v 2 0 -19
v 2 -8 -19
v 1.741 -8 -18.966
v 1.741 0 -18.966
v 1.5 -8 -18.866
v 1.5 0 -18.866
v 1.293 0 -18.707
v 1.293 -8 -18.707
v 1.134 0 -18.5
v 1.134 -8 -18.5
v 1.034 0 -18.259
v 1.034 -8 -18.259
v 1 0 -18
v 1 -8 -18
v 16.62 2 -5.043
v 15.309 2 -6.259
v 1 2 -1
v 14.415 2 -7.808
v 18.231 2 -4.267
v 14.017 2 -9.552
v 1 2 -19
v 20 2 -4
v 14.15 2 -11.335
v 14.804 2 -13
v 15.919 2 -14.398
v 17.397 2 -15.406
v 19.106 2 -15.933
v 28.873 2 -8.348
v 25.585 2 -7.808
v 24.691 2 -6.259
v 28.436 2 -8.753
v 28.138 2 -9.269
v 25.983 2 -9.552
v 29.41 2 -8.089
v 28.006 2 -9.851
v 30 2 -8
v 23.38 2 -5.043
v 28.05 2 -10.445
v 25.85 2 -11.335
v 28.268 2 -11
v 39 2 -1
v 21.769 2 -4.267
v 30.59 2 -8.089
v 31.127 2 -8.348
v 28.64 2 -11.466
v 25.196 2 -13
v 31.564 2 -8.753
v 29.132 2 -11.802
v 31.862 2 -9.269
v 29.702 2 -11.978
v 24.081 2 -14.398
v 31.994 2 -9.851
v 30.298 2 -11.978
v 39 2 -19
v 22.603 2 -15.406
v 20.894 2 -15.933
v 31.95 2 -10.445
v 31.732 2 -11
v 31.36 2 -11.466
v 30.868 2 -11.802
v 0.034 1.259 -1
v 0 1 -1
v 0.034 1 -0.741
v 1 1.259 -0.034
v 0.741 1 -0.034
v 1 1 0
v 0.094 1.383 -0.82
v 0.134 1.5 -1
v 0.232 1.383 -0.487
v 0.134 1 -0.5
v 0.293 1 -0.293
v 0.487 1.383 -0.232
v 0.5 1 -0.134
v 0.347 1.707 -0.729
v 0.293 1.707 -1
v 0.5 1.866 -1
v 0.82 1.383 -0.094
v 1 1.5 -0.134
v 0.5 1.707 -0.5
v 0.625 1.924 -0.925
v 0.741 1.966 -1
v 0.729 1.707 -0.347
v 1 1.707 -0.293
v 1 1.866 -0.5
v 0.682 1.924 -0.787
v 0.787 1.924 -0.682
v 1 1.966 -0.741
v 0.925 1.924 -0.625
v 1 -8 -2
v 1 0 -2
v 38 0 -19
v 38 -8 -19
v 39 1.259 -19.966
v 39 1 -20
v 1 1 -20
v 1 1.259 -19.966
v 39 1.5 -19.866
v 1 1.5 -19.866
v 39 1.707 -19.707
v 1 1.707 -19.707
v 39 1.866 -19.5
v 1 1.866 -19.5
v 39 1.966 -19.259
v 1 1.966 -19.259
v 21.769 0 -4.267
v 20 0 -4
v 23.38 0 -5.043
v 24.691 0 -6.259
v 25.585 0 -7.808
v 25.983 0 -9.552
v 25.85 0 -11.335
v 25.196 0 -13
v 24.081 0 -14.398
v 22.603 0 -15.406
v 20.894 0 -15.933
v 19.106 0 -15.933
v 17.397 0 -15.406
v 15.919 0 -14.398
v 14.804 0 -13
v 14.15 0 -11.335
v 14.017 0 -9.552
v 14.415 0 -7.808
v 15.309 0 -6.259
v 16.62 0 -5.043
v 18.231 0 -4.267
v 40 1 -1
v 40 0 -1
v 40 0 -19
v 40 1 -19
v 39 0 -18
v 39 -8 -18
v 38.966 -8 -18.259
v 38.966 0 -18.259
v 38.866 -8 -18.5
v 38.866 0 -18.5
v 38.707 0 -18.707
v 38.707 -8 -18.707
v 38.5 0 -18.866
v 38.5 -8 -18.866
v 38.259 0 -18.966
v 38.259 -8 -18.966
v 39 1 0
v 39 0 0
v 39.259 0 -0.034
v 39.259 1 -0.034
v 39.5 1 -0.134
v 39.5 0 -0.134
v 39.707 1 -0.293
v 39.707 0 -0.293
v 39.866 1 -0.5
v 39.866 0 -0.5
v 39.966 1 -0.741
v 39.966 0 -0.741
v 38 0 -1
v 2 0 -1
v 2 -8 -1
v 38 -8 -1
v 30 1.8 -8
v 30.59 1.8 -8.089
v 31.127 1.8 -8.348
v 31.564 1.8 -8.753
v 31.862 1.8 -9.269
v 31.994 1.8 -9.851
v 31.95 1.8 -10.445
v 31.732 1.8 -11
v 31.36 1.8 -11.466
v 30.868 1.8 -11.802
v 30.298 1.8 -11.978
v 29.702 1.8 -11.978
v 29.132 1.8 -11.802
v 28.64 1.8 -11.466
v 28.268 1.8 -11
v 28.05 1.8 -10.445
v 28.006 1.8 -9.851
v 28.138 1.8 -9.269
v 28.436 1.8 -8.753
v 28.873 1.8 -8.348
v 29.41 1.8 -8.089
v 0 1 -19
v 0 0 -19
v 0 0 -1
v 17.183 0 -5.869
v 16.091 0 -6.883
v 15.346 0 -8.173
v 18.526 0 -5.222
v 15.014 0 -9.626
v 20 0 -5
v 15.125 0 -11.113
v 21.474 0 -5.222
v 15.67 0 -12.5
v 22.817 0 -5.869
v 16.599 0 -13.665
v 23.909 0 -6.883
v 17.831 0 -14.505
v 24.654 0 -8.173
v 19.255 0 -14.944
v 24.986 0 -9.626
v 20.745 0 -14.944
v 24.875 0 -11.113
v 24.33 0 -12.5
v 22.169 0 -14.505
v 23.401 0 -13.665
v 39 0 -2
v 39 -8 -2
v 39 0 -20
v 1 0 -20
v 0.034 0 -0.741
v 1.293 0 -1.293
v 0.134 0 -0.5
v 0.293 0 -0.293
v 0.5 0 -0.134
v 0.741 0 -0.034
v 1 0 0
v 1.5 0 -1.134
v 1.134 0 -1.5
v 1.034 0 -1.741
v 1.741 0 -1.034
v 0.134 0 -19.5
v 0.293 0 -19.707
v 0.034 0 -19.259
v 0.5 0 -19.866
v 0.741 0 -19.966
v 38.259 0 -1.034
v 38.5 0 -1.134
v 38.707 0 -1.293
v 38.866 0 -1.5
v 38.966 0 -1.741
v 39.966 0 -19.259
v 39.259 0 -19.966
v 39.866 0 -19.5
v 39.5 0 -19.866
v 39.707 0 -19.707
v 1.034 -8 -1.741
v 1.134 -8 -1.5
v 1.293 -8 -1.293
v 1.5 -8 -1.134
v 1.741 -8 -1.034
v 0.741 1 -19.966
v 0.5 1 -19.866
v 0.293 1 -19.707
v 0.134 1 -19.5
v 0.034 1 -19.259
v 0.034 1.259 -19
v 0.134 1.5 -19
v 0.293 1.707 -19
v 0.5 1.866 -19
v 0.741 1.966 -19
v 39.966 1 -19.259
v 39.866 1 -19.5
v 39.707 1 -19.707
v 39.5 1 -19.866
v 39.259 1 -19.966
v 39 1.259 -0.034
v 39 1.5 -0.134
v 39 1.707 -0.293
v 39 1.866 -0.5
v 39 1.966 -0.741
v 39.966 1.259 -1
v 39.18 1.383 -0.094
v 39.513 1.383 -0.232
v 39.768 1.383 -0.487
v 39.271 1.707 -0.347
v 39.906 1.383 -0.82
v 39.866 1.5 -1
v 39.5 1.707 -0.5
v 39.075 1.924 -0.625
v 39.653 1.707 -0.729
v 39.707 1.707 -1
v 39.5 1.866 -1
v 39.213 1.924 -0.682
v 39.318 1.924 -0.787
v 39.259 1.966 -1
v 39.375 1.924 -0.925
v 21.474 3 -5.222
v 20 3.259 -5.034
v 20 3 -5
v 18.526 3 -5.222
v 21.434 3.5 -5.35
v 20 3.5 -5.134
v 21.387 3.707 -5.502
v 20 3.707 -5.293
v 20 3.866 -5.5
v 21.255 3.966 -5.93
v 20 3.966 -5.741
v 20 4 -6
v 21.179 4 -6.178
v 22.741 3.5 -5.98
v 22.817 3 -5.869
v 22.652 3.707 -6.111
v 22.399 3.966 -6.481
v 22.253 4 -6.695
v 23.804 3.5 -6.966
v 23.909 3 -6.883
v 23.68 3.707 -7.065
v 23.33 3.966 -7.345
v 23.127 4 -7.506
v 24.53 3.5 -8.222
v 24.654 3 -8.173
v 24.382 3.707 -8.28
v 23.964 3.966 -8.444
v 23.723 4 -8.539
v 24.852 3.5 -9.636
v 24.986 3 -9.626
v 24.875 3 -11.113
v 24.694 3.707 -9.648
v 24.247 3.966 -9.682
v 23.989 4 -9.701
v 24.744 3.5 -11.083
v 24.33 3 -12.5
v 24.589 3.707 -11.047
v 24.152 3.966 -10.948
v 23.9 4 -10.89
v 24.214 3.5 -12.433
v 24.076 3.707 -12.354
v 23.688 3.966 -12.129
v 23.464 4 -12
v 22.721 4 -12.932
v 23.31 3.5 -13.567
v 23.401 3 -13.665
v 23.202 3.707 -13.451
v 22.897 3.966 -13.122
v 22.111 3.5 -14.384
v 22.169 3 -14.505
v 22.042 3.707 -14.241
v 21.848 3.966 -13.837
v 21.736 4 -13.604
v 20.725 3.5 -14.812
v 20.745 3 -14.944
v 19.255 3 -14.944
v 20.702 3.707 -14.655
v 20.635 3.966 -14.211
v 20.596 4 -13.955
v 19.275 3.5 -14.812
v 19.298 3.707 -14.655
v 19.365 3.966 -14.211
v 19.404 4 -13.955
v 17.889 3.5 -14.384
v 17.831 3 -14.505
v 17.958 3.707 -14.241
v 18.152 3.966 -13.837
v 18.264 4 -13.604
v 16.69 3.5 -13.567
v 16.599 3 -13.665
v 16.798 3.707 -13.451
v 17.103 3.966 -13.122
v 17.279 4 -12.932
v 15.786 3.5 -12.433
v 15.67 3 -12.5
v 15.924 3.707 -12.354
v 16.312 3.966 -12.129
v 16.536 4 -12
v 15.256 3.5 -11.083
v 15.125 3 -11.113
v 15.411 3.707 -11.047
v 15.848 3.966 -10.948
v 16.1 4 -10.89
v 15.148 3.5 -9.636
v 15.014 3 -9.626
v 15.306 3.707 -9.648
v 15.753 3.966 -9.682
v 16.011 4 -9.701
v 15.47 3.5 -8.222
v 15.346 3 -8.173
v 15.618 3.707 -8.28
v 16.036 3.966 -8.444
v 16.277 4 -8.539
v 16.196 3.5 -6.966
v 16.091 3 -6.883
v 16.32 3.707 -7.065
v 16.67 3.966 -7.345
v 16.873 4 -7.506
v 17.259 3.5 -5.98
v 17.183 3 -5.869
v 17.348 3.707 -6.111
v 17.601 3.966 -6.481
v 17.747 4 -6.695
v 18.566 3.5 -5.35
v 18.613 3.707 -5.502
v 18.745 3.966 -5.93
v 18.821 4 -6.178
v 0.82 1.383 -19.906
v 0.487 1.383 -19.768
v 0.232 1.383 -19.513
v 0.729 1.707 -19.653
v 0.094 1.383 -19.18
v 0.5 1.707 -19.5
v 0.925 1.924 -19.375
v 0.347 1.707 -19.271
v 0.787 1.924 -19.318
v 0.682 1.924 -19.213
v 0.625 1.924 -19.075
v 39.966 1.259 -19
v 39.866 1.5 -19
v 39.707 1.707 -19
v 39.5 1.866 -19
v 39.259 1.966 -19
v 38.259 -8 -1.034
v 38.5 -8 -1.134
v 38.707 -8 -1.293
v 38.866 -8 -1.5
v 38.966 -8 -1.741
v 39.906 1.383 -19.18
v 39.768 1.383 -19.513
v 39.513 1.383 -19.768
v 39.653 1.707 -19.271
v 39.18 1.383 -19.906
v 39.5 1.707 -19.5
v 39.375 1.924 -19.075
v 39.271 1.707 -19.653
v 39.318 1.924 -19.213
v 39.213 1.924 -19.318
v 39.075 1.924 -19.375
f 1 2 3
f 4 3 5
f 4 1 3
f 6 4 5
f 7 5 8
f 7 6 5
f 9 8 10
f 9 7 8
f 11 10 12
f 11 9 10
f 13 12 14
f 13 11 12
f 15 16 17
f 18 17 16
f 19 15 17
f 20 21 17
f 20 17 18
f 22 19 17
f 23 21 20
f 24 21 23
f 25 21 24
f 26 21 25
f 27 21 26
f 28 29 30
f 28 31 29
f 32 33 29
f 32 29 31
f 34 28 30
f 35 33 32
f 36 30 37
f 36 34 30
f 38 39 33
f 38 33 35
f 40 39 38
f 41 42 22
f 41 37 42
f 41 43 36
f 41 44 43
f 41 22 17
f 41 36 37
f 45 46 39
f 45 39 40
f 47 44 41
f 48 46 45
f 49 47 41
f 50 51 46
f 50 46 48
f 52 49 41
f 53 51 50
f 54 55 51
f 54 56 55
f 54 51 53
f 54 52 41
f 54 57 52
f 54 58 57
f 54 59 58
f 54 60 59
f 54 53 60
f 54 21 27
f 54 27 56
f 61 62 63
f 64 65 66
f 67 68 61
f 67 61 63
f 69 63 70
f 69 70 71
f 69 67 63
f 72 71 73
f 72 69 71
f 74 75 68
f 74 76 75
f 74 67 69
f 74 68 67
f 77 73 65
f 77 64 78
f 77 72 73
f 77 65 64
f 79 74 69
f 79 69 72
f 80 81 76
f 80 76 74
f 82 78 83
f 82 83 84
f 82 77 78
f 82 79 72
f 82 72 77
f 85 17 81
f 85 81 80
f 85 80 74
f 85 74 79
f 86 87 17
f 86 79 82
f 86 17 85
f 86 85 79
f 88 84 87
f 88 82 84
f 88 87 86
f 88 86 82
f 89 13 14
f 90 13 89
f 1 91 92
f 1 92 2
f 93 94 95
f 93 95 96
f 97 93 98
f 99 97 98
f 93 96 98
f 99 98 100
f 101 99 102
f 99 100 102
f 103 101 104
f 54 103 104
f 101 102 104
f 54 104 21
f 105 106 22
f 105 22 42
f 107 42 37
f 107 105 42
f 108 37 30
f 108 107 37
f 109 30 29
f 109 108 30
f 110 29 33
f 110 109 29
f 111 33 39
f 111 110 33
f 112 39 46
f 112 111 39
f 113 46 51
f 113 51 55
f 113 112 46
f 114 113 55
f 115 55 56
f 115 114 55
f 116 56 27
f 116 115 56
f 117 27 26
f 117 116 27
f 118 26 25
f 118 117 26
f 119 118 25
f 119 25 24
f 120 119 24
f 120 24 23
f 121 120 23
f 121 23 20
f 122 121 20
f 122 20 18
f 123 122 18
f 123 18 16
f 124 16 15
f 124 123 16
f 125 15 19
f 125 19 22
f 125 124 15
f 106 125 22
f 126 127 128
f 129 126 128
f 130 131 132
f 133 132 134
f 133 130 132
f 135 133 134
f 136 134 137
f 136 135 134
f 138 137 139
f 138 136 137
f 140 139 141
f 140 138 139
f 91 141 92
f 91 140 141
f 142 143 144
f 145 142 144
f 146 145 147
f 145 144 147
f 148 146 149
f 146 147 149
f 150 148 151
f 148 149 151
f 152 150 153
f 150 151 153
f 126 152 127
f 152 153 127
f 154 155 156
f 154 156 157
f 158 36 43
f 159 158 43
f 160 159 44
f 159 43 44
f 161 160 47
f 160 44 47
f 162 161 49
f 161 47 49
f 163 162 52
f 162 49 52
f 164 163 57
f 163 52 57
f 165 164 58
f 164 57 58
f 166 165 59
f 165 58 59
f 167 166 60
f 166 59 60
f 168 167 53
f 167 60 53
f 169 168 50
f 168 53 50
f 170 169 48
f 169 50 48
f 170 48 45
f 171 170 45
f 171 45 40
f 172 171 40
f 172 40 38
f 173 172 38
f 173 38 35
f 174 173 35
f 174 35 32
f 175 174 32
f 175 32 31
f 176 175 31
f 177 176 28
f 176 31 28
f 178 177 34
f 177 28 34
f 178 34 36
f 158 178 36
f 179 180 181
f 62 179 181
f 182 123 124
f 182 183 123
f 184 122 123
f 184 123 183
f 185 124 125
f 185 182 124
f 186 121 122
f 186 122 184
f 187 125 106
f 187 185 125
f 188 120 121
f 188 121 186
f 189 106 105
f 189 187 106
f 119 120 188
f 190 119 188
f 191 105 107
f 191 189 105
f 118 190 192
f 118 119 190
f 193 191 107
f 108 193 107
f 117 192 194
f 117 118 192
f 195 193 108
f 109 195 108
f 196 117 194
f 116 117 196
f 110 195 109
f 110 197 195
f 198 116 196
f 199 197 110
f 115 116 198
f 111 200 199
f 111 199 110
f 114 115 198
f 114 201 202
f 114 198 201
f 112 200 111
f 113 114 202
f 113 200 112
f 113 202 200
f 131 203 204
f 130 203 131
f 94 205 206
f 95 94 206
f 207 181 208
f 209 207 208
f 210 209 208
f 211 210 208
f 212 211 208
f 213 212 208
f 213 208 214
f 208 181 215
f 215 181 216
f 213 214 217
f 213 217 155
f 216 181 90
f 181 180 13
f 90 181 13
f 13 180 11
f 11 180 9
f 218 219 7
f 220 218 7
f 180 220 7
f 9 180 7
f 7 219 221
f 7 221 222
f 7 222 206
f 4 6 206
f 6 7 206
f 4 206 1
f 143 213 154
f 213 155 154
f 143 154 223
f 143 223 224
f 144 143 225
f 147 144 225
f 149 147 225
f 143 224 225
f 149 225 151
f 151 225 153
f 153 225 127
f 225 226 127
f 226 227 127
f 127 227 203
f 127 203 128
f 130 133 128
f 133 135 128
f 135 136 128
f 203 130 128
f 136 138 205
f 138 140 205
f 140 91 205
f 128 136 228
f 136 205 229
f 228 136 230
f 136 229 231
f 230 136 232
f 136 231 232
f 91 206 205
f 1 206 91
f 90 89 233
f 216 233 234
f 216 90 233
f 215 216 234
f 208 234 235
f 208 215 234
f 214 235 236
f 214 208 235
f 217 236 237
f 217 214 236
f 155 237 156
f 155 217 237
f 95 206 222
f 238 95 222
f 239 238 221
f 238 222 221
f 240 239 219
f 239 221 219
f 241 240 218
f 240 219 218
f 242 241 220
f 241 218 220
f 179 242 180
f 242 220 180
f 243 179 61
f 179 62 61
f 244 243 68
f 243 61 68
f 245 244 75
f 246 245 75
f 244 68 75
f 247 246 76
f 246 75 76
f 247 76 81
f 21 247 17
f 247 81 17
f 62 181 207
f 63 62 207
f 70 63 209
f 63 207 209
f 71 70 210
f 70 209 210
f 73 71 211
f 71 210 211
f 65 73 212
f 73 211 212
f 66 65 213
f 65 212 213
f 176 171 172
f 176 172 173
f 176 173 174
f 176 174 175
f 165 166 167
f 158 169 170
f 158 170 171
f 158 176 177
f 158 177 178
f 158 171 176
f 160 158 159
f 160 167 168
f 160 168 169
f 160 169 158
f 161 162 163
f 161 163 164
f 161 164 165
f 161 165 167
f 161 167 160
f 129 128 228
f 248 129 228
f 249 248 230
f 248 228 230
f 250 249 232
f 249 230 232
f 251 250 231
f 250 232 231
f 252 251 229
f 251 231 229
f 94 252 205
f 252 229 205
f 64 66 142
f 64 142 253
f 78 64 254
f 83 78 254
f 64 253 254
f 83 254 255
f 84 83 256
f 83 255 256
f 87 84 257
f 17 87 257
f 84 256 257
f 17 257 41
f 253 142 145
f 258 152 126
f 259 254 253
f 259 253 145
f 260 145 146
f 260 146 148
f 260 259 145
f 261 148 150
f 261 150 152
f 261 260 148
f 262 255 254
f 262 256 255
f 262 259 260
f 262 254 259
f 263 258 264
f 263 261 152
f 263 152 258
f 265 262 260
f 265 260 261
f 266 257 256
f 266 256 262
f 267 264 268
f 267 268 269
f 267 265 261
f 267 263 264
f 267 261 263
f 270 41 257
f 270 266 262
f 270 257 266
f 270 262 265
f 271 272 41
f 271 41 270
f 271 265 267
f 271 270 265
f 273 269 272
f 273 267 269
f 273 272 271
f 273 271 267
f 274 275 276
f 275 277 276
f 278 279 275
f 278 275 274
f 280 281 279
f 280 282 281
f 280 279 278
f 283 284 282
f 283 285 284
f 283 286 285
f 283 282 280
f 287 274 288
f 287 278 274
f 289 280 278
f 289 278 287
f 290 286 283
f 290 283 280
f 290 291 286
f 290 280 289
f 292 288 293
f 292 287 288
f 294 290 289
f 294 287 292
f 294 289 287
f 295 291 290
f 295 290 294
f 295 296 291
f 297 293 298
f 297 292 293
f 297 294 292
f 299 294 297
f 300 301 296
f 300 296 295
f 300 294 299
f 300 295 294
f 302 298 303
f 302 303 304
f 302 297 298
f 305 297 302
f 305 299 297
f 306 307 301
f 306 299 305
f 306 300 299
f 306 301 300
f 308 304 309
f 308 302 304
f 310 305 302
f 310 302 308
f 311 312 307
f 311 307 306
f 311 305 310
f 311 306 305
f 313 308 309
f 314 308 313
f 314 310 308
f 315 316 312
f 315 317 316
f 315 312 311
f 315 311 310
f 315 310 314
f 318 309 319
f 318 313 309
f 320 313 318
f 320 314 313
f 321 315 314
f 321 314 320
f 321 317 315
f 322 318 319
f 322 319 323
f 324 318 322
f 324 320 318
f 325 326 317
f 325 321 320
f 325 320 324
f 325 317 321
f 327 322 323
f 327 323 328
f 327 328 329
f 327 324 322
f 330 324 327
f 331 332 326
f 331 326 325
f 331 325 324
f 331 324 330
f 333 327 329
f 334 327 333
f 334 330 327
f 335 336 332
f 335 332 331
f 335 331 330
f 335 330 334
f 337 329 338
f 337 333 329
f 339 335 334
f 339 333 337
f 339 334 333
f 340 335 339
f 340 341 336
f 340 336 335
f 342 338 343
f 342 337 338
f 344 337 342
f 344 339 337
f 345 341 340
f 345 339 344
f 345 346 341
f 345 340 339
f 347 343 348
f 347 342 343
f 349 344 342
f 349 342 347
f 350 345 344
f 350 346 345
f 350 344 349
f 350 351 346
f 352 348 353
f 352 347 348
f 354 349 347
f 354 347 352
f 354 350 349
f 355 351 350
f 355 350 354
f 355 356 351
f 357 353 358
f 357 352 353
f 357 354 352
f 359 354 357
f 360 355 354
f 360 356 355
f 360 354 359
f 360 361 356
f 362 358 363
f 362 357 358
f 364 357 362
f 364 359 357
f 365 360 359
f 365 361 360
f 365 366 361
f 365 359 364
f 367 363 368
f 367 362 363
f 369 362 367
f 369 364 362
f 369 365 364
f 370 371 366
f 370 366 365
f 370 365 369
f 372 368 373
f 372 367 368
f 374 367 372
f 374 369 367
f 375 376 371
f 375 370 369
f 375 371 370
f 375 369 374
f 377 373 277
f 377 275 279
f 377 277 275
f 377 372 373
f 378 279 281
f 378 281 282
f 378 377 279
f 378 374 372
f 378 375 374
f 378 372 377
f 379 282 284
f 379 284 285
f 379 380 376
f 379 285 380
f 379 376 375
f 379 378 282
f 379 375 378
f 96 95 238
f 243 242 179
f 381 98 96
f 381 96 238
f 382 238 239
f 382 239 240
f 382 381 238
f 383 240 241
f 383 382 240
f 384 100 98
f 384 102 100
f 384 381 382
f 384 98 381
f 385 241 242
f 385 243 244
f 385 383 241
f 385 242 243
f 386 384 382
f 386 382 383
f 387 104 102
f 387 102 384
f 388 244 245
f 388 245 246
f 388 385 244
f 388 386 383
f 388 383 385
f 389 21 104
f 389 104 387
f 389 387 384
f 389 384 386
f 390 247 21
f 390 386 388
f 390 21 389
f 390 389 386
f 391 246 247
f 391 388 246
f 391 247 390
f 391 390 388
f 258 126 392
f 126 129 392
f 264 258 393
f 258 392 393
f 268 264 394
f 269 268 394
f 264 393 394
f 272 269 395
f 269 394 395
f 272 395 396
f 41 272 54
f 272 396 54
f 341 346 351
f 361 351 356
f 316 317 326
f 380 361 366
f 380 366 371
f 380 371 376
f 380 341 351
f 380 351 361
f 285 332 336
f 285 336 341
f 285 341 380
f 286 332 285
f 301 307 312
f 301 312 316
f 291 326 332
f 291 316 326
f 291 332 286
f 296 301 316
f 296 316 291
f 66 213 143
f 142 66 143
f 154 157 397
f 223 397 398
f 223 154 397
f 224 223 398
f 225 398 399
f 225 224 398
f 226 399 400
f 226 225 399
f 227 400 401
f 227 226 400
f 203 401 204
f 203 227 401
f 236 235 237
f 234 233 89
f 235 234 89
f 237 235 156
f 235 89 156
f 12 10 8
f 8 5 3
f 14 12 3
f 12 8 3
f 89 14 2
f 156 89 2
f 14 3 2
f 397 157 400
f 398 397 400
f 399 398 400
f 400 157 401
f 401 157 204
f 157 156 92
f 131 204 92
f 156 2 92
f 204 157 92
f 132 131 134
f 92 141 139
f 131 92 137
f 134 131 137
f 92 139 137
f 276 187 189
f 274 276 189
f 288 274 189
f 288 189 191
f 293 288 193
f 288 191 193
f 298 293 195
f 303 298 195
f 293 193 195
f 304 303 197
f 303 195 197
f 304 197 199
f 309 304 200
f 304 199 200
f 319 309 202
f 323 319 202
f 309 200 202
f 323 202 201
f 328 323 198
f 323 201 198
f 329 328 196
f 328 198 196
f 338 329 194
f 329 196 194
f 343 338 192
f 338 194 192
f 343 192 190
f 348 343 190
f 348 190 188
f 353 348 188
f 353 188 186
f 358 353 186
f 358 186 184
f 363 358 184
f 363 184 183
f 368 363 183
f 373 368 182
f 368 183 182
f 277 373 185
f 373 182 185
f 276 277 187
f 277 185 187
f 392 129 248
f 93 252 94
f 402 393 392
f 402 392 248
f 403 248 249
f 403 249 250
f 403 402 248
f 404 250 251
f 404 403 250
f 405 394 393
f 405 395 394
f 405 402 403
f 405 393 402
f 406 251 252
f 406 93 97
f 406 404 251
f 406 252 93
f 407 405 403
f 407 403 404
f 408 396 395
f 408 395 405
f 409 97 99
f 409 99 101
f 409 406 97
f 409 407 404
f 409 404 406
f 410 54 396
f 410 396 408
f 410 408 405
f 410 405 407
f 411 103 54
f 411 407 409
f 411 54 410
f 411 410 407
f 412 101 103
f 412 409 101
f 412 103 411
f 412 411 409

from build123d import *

# Parameters (mm, degrees)
SKETCH1_R           = 6
BOSS_EXTRUDE1_DEPTH = 2
BOSS_EXTRUDE2_DEPTH = 8
SKETCH3_R           = 5
BOSS_EXTRUDE3_DEPTH = 4
SKETCH4_R           = 2
CUT_EXTRUDE1_DEPTH  = 0.2
FILLET1_R           = 1


with BuildPart() as part:
    # Sketch1 → Boss-Extrude1 (new body)
    with BuildSketch(Plane(origin=(0, 0, 0), x_dir=(1, 0, 0), z_dir=(0, 1, 0))):
        with BuildLine():
            Line((1, 0), (39, 0))
            ThreePointArc((39, 0), (39.707106781, 0.292893219), (40, 1))
            Line((40, 1), (40, 19))
            ThreePointArc((40, 19), (39.707106781, 19.707106781), (39, 20))
            Line((39, 20), (1, 20))
            ThreePointArc((1, 20), (0.292893219, 19.707106781), (0, 19))
            Line((0, 19), (0, 1))
            ThreePointArc((0, 1), (0.292893219, 0.292893219), (1, 0))
        make_face()
        with Locations(Location((20, 10, 0), (0, 0, 270))):
            Circle(SKETCH1_R, mode=Mode.SUBTRACT)
    extrude(amount=BOSS_EXTRUDE1_DEPTH)

    # Sketch2 → Boss-Extrude2 (add)
    with BuildSketch(Plane(origin=(0, 0, 0), x_dir=(1, 0, 0), z_dir=(0, 1, 0))):
        with BuildLine():
            Line((2, 1), (38, 1))
            ThreePointArc((38, 1), (38.707106781, 1.292893219), (39, 2))
            Line((39, 2), (39, 18))
            ThreePointArc((39, 18), (38.707106781, 18.707106781), (38, 19))
            Line((38, 19), (2, 19))
            ThreePointArc((2, 19), (1.292893219, 18.707106781), (1, 18))
            Line((1, 18), (1, 2))
            ThreePointArc((1, 2), (1.292893219, 1.292893219), (2, 1))
        make_face()
    extrude(amount=-BOSS_EXTRUDE2_DEPTH)

    # Sketch3 → Boss-Extrude3 (add)
    with BuildSketch(Plane(origin=(0, 0, 0), x_dir=(1, 0, 0), z_dir=(0, 1, 0))):
        with Locations(Location((20, 10, 0), (0, 0, 270))):
            Circle(SKETCH3_R)
    extrude(amount=BOSS_EXTRUDE3_DEPTH)

    # Sketch4 → Cut-Extrude1 (cut)
    with BuildSketch(Plane(origin=(0, 2, 0), x_dir=(1, 0, 0), z_dir=(0, 1, 0))):
        with Locations(Location((30, 10, 0), (0, 0, 270))):
            Circle(SKETCH4_R)
    extrude(amount=-CUT_EXTRUDE1_DEPTH, mode=Mode.SUBTRACT)

    # Fillet1
    fillet1_edges = [part.edges().sort_by_distance(p)[0] for p in [
        (39.707106781, 2, -0.292893219),
        (40, 2, -10),
        (39.707106781, 2, -19.707106781),
        (20, 2, -20),
        (0.292893219, 2, -19.707106781),
        (0, 2, -10),
        (0.292893219, 2, -0.292893219),
        (20, 4, -15),
        (20, 2, 0),
    ]]
    fillet(fillet1_edges, radius=FILLET1_R)


solid = part.part
